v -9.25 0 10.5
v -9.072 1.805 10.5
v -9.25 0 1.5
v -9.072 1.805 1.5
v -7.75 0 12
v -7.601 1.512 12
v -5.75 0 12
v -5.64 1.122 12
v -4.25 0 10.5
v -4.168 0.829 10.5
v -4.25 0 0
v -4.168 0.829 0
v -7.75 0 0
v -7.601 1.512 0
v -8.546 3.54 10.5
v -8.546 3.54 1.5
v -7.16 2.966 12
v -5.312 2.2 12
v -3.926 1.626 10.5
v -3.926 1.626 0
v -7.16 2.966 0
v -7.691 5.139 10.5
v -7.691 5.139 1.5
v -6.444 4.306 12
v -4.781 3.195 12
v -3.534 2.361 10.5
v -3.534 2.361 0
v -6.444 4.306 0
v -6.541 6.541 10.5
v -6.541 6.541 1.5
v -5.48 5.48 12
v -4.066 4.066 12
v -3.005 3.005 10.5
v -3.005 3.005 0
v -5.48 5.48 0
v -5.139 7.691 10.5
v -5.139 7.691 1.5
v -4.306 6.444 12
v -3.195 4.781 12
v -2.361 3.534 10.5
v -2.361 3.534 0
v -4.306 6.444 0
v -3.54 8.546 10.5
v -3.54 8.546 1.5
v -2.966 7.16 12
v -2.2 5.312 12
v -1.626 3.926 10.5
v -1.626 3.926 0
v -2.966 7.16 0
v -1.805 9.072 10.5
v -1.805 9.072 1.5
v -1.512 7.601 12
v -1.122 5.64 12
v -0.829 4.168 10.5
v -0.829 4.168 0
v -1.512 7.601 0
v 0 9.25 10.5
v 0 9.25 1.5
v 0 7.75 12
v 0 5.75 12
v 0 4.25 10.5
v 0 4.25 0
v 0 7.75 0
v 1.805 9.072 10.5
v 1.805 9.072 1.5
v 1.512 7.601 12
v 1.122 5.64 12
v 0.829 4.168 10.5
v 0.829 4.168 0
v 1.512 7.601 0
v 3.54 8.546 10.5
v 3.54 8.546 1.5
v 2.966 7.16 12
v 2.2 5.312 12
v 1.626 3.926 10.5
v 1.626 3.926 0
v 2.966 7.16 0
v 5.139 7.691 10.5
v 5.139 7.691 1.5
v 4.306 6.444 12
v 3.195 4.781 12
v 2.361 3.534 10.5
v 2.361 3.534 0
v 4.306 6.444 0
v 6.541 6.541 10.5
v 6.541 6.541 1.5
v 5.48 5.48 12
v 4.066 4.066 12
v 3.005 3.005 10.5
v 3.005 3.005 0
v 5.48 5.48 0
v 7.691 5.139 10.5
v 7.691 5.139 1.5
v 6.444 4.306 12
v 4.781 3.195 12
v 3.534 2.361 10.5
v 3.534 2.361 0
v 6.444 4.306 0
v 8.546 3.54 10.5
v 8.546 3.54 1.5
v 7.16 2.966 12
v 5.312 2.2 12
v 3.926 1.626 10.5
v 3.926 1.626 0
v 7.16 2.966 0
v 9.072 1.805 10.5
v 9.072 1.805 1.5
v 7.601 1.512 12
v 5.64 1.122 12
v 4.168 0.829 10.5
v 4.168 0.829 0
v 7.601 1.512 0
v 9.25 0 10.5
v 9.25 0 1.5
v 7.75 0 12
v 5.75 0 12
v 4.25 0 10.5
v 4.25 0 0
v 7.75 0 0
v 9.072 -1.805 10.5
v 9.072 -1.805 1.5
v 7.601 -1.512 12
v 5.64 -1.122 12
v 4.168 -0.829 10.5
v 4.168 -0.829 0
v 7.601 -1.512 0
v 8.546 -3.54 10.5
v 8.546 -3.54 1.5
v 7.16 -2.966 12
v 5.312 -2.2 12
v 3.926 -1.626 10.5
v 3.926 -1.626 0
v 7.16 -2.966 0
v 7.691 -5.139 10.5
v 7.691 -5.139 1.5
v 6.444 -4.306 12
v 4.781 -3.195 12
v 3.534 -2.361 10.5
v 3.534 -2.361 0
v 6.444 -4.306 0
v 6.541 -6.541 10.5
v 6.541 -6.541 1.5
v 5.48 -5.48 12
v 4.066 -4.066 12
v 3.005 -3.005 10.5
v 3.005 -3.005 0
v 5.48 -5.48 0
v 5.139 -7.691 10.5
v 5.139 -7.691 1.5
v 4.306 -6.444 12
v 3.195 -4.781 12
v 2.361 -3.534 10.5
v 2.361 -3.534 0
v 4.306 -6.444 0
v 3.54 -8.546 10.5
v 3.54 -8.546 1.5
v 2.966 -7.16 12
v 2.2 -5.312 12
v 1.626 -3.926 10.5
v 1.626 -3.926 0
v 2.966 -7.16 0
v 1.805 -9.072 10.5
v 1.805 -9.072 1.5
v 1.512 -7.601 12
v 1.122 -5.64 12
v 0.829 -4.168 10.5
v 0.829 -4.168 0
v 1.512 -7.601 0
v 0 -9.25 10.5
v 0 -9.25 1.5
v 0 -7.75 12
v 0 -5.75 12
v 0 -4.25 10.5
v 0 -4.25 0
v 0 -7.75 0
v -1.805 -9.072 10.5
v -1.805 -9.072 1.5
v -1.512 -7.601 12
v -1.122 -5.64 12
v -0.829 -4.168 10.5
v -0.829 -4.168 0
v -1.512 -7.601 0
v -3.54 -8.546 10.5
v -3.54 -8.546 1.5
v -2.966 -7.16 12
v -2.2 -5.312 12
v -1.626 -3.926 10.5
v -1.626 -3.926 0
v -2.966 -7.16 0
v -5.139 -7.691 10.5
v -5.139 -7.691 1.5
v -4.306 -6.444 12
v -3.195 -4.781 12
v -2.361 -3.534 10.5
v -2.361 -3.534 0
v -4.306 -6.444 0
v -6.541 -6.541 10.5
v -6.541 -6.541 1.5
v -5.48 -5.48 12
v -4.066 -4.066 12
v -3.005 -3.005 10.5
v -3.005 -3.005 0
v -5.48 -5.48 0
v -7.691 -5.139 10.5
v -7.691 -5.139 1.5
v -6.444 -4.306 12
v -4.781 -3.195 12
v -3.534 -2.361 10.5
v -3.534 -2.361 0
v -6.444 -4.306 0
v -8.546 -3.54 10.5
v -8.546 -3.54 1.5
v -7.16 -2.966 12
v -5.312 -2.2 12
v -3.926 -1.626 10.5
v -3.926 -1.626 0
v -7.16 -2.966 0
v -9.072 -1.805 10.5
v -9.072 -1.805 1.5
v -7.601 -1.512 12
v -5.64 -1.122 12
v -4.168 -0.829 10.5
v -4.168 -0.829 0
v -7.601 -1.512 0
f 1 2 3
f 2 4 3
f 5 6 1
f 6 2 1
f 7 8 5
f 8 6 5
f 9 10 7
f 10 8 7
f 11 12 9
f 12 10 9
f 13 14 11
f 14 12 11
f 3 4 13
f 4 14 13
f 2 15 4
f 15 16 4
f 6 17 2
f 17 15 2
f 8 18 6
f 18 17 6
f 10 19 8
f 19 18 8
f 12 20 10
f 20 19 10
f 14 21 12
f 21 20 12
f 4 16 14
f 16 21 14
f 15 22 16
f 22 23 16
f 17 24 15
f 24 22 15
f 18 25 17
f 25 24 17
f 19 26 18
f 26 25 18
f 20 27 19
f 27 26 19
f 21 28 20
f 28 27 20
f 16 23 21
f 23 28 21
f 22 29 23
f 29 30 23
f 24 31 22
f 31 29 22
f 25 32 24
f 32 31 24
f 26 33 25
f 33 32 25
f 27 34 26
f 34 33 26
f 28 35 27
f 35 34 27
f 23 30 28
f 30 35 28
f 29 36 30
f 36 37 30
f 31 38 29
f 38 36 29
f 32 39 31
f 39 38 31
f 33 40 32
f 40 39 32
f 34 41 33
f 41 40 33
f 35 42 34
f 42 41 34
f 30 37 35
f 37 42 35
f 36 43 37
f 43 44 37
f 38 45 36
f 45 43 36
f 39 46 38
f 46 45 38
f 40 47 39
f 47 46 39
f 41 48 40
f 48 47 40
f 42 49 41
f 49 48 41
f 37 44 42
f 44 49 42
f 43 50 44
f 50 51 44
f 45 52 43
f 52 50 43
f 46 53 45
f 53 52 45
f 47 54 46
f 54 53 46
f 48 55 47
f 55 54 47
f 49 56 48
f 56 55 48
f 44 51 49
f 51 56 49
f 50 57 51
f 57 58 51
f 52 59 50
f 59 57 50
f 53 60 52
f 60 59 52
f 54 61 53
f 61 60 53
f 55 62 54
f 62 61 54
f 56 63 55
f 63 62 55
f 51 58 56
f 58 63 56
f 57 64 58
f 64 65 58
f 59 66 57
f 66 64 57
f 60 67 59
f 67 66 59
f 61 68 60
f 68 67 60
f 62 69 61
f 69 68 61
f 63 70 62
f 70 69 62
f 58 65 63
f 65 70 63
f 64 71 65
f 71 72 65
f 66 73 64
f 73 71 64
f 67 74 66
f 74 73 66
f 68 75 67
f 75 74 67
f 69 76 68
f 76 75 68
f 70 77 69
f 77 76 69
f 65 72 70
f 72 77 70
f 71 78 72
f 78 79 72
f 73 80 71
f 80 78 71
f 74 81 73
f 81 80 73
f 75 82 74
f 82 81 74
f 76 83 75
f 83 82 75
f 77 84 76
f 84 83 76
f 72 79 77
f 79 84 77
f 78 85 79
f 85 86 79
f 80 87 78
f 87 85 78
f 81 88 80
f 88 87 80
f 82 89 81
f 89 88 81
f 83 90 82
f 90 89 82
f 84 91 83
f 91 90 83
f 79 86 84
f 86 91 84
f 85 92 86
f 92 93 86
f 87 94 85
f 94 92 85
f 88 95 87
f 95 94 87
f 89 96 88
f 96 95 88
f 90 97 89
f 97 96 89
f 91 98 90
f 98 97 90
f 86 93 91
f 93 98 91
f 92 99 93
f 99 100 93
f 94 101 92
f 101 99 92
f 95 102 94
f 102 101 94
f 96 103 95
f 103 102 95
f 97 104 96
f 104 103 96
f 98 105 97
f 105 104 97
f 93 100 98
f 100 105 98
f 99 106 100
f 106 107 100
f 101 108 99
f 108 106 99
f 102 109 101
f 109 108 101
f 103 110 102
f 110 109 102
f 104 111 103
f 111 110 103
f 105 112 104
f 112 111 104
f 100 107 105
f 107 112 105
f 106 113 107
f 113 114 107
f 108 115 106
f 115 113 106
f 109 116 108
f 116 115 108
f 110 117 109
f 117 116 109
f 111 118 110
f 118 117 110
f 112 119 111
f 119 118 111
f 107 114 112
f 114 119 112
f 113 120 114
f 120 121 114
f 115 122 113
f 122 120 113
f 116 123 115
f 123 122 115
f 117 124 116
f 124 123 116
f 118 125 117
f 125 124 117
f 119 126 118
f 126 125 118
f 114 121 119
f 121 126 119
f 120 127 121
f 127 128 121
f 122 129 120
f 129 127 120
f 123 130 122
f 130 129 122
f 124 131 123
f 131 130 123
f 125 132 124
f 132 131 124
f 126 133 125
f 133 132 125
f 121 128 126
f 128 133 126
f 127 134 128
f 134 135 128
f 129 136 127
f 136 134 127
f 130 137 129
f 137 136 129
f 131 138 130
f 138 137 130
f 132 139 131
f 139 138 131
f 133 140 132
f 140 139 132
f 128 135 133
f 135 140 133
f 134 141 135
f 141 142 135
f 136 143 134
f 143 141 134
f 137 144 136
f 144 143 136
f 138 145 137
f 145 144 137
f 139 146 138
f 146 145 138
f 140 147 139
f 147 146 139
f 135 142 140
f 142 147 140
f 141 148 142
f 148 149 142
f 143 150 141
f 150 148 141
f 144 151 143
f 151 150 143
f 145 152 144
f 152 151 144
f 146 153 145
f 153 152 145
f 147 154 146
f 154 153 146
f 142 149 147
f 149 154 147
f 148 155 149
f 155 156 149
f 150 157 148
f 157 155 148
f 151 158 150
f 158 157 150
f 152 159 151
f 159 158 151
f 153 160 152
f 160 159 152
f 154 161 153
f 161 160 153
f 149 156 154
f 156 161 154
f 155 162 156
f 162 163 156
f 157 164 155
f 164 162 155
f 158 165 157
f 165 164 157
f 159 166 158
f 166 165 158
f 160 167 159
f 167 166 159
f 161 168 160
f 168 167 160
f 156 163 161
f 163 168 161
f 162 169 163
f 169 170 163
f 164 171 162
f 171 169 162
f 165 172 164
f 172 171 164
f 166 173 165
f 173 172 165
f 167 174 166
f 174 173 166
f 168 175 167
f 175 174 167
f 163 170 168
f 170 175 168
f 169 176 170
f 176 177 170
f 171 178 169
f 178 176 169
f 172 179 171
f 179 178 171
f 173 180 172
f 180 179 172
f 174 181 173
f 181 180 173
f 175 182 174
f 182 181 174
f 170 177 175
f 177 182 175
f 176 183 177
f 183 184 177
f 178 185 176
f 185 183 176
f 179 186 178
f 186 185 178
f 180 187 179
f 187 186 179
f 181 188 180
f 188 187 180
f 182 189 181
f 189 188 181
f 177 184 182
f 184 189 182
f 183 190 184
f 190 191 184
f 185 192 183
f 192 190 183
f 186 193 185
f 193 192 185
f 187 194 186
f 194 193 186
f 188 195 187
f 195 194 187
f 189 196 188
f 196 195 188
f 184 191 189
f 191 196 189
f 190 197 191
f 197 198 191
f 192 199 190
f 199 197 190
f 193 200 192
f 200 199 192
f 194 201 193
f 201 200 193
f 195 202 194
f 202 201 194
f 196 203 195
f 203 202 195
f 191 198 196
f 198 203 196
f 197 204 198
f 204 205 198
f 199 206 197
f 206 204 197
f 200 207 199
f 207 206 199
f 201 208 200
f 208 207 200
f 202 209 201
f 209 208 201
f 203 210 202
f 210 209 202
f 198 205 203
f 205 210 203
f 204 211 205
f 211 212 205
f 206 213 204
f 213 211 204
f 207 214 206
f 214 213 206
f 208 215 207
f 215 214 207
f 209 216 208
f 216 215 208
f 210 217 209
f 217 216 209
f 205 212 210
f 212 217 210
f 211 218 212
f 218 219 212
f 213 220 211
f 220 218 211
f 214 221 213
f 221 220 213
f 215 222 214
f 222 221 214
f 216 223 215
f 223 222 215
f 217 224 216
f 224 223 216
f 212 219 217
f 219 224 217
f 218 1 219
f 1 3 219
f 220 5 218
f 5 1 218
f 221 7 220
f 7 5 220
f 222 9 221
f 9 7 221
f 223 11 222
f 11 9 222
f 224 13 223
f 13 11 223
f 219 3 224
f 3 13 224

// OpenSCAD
$fn = 32;

// ----------------------------------------------------------------------
// Form washer: chamfered washer, 18.5 mm outside, 8.5 mm bore
// ----------------------------------------------------------------------

// --- parameters (mm) ---
revolve_angle = 360;      // full turn around the Z axis
profile_points = 7;       // points of the closed outline

profile = [[4.25, 0], [7.75, 0], [9.25, 1.5], [9.25, 10.5], [7.75, 12], [5.75, 12], [4.25, 10.5]];  // single closed polygon, 7 points, counter clockwise

// --- the one profile operation ---
rotate_extrude(angle = revolve_angle) polygon(points = profile);
